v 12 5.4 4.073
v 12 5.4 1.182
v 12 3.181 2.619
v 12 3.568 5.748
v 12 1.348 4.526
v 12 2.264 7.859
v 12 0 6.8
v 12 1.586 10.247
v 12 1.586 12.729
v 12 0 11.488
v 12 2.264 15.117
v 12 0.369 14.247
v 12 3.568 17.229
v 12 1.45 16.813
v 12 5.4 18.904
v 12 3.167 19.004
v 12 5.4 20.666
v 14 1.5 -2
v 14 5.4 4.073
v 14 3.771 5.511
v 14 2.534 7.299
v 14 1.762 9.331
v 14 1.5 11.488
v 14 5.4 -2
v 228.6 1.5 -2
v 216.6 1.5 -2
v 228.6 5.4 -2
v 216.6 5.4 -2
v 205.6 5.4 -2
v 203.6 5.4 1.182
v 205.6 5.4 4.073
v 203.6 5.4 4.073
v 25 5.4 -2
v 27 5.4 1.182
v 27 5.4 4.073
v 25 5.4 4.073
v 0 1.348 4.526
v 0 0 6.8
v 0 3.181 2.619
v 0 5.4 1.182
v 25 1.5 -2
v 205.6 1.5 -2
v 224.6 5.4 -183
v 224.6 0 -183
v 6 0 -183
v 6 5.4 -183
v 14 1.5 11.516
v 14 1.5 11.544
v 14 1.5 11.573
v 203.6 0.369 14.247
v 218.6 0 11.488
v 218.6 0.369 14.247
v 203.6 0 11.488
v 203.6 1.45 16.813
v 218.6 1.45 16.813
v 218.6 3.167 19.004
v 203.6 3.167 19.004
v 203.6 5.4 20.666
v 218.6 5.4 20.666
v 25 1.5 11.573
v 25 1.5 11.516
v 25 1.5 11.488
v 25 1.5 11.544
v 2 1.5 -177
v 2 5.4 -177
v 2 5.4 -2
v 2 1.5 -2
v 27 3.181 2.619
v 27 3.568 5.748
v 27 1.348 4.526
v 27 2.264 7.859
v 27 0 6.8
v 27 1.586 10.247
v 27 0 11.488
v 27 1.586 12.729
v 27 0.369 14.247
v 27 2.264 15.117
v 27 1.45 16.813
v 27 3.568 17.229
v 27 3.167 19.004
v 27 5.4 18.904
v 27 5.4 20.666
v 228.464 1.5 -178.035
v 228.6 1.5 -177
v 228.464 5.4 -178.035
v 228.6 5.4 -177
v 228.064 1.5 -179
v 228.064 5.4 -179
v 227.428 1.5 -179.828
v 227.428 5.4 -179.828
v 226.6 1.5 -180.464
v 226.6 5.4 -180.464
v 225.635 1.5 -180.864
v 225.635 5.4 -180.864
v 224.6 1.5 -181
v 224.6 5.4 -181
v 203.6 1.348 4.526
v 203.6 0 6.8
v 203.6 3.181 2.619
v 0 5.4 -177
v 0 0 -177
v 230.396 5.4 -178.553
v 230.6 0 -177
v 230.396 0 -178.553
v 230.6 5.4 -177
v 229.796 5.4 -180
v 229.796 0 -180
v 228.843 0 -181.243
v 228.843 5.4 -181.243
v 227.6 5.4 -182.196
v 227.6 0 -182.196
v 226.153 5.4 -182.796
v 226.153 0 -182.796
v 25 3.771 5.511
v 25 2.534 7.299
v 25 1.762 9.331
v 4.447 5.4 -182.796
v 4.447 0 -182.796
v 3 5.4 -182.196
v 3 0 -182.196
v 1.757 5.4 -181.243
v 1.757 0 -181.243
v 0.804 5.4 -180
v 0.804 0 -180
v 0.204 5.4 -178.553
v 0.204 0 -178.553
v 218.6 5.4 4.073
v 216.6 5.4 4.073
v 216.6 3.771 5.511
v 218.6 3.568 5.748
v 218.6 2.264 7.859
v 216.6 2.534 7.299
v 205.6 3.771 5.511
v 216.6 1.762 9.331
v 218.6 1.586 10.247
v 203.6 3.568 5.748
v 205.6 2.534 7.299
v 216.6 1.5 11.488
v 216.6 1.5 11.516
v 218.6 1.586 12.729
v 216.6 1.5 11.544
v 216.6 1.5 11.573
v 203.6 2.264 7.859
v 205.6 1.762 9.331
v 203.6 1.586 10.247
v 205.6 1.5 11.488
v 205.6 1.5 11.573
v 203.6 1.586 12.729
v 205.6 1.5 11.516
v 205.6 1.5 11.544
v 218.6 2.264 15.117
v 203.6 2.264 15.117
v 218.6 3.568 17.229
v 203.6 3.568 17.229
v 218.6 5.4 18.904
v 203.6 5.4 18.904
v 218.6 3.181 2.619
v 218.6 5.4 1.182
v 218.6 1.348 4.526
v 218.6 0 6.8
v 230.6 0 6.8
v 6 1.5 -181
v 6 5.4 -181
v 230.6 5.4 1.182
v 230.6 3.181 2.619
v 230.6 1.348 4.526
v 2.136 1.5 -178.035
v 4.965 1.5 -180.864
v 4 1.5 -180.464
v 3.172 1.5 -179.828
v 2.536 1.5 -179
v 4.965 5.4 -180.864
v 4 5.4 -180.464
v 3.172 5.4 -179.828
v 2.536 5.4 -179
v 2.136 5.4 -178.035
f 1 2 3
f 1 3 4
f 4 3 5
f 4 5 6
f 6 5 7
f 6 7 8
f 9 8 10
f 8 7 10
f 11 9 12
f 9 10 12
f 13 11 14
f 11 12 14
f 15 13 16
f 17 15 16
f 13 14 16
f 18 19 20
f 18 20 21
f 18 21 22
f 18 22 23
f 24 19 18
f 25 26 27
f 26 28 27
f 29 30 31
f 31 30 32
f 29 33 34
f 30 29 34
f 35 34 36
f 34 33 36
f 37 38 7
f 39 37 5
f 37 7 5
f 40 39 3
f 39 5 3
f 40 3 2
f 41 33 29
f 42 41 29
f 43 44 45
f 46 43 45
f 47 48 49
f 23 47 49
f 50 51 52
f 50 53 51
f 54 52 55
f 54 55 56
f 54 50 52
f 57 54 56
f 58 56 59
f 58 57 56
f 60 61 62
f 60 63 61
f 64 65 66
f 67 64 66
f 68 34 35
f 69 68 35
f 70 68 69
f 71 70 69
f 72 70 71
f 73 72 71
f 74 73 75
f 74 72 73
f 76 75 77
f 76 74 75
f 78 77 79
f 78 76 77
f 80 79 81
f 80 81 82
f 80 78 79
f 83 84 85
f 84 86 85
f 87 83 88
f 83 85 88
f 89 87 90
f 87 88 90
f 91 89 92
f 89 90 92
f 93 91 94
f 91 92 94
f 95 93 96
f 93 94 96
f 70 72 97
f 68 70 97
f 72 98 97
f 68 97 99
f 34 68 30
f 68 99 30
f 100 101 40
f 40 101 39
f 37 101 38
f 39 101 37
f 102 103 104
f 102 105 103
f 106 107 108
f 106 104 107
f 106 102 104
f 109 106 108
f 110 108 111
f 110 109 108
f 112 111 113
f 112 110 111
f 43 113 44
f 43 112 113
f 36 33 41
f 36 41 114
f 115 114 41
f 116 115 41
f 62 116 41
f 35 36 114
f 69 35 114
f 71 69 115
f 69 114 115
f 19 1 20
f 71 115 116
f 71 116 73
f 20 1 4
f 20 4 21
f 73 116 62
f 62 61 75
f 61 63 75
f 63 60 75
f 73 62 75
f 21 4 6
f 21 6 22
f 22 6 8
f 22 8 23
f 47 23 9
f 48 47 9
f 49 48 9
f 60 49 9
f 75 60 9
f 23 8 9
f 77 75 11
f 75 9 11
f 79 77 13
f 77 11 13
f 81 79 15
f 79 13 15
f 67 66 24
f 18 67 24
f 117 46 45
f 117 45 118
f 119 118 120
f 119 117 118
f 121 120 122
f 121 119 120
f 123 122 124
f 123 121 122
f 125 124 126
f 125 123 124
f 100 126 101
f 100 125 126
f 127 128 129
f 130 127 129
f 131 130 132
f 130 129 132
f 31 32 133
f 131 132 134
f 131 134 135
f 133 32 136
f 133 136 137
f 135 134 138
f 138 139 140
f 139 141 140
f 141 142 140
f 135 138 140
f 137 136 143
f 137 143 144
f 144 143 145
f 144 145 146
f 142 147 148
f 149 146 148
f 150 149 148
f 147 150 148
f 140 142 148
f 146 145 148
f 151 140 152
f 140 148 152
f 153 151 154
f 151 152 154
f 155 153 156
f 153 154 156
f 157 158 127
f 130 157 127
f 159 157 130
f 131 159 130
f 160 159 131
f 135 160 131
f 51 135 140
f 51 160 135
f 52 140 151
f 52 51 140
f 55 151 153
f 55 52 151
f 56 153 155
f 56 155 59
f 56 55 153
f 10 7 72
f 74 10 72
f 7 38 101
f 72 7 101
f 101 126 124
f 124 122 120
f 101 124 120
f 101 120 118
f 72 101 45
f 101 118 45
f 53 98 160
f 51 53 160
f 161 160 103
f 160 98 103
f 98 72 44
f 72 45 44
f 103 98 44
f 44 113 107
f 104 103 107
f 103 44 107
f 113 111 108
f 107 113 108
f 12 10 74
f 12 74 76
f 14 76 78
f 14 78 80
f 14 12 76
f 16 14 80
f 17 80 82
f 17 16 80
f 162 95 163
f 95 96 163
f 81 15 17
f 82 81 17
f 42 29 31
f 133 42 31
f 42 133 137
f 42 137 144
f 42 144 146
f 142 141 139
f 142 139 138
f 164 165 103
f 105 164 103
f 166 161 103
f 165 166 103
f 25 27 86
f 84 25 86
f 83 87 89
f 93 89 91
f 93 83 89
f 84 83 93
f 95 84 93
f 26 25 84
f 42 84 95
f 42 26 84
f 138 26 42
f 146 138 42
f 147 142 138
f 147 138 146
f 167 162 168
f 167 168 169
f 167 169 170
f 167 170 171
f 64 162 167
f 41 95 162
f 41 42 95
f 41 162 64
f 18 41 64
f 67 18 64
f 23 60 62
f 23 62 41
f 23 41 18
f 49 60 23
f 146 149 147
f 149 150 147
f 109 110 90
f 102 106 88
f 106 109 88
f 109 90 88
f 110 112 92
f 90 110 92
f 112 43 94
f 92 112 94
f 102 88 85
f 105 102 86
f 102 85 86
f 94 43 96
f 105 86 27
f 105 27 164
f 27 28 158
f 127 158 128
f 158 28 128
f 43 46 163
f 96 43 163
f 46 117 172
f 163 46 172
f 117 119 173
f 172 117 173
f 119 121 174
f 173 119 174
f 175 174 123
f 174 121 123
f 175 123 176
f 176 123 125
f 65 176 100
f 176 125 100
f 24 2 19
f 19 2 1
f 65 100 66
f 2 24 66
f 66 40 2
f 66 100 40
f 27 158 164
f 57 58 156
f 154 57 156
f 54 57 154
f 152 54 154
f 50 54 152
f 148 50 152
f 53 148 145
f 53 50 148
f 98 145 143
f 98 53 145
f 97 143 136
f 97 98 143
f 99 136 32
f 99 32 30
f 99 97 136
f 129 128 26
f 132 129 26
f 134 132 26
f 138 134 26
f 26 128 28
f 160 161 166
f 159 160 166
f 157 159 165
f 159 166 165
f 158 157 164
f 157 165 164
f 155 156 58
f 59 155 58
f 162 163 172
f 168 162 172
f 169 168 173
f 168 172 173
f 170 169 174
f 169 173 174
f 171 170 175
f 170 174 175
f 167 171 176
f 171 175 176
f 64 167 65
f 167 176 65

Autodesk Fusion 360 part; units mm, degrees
sketch "Sketch1" plane through (0, 0, 0) normal (0, 1, 0) x (1, 0, 0)
  line L0 (0, 0) -> (230.6, 0)
  line L1 (230.6, 0) -> (230.6, 183)
  line L2 (230.6, 183) -> (0, 183)
  line L3 (0, 183) -> (0, 0)
  dimension "d1" = 230.6
  dimension "d2" = 183
extrude "Extrude1" add sketch "Sketch1" along normal blind 10
sketch "Sketch9" plane through (0, 0, 0) normal (-1, 0, 0) x (0, 0, 1)
  line L0 (-183, 0) -> (0, 0)
  line L1 (0, 0) -> (0, 10)
  line L2 (0, 10) -> (-183, 10)
  line L3 (-183, 10) -> (-183, 0)
  circle A0 centre (11.4881, 10.5) radius 10.5
  line L4 (11.4881, 0) -> (0, 0)
  circle A1 centre (11.4881, 10.5) radius 9
  line L5 (0, 0) -> (1, 0)
  line L6 (1, 0) -> (1, 10)
  line L7 (1, 10) -> (0, 10)
  line L8 (0, 10) -> (0, 0)
  dimension "d69" = 21
  dimension "d70" = 18
  dimension "d94" = 1
extrude "Extrude8" add sketch "Sketch9" against normal up to surface (230.6 mm away) contours L1 L4 L5 L6 L7 L8 | A0 L4 L6 | A0
sketch "Sketch10" plane through (0, 0, 0) normal (0, -1, 0) x (1, 0, 0)
  line L0 (230.6, -183) -> (230.6, 11.4881)
  line L1 (230.6, 11.4881) -> (0, 11.4881)
  line L2 (0, 11.4881) -> (0, -183)
  line L3 (230.6, 0) -> (218.6, 0)
  line L4 (218.6, 0) -> (218.6, 22)
  line L5 (218.6, 22) -> (230.6, 22)
  line L6 (230.6, 22) -> (230.6, 0)
  line L7 (203.6, 0) -> (27, 0)
  line L8 (27, 0) -> (27, 22)
  line L9 (27, 22) -> (203.6, 22)
  line L10 (203.6, 22) -> (203.6, 0)
  line L11 (0, 0) -> (12, 0)
  line L12 (12, 0) -> (12, 22)
  line L13 (12, 22) -> (0, 22)
  line L14 (0, 22) -> (0, 0)
  line L15 (0, -183) -> (230.6, -183)
  dimension "d73" = 22
  dimension "d74" = 12
  dimension "d75" = 12
  dimension "d76" = 15
  dimension "d77" = 15
extrude "Extrude9" cut sketch "Sketch10" against normal through all contours L0 L1 L3 L4 L6 | L1 L4 L5 L6 | L1 L2 L11 L12 L14 | L1 L12 L13 L14 | L1 L7 L8 L10 | L1 L8 L9 L10
sketch "Sketch11" plane through (0, 10, 0) normal (0, 1, 0) x (-1, 0, 0)
  line L0 (0, -183) -> (0, 0)
  line L1 (-1.8, -176) -> (-228.8, -176)
  line L2 (-228.8, -176) -> (-228.8, -1)
  line L3 (-228.8, -1) -> (-1.8, -1)
  line L4 (-1.8, -1) -> (-1.8, -176)
  line L5 (-115.3, -122.9084) -> (-115.3, -50) construction
  line L6 (-230.6, 0) -> (-230.6, -183)
  line L7 (-230.6, -183) -> (0, -183)
  line L8 (-12, 0) -> (-12, 1)
  line L9 (-12, 1) -> (-27, 1)
  line L10 (-27, 1) -> (-27, 0)
  line L11 (-27, 0) -> (-203.6, 0)
  line L12 (-203.6, 0) -> (-203.6, 1)
  line L13 (-203.6, 1) -> (-218.6, 1)
  line L14 (-218.6, 1) -> (-218.6, 0)
  line L15 (-218.6, 0) -> (-230.6, 0)
  line L16 (0, 0) -> (-12, 0)
  dimension "d79" = 227
  dimension "d80" = 175
extrude "Extrude10" cut sketch "Sketch11" against normal blind 2 contours L1 L2 L3 L4
sketch "Sketch12" plane through (0, 8, 0) normal (0, 1, 0) x (-1, 0, 0)
  line L0 (-1.8, -1) -> (-228.8, -1)
  line L1 (-1.8, -176) -> (-1.8, -1)
  line L2 (-6.95, -6.345) -> (-223.65, -6.345)
  line L3 (-223.65, -6.345) -> (-223.65, -181.345)
  line L4 (-223.65, -181.345) -> (-6.95, -181.345)
  line L5 (-6.95, -181.345) -> (-6.95, -6.345)
  line L6 (-10.47, -167.125) -> (-220.13, -167.125)
  line L7 (-220.13, -167.125) -> (-220.13, -9.875)
  line L8 (-220.13, -9.875) -> (-10.47, -9.875)
  line L9 (-10.47, -9.875) -> (-10.47, -167.125)
  line L10 (-85, -88.5) -> (-145, -88.5) construction
  line L11 (-115.3, -115.3819) -> (-115.3, -64.9996) construction
  line L12 (-228.8, -1) -> (-228.8, -176)
  line L13 (-228.8, -176) -> (-1.8, -176)
  dimension "d84" = 175
  dimension "d85" = 216.7
  dimension "d86" = 209.66
  dimension "d87" = 157.25
  dimension "d88" = 3.52
  dimension "d89" = 3.53
extrude "Extrude11" cut sketch "Sketch12" against normal blind 1 contours L2 L3 L5 L13 | L3 L4 L5 L13 | L6 L7 L8 L9
fillet "Fillet1" radius 6 2 edges at (0, 5, -183) (230.6, 5, -183)
sketch "Sketch15" plane through (12, 0, 0) normal (-1, 0, 0) x (0, 0, 1)
  line L0 (0, 10) -> (0, 0)
  line L1 (0, 0) -> (11.4881, 0)
  arc A0 (11.4881, 0) -> (1, 10) centre (11.4881, 10.5) ccw
  circle A1 centre (11.4881, 10.5) radius 11.499
  line L2 (0, 0) -> (6.8002, 0)
  line L3 (1, 10) -> (0, 10)
  circle A2 centre (11.4881, 10.5) radius 9
extrude "Extrude14" add sketch "Sketch15" along normal blind 12 and the other way blind 218.6 contours L0 L1 A1 L2
sketch "Sketch13" plane through (0, 0, 0) normal (-1, 0, 0) x (0, 0, 1)
  line L0 (-177, 10) -> (-177, 0)
  line L1 (-177, 0) -> (6.8002, 0)
  line L2 (0, 10) -> (-177, 10)
  line L3 (-183, 5.4) -> (22, 5.4)
  line L4 (22, 5.4) -> (22, 23.4)
  line L5 (22, 23.4) -> (-183, 23.4)
  line L6 (-183, 23.4) -> (-183, 5.4)
  arc A0 (0, 10) -> (6.8002, 0) centre (11.4881, 10.5) ccw
  dimension "d95" = 4.6
  dimension "d96" = 6
  dimension "d97" = 205
  dimension "d98" = 18
extrude "Extrude12" cut sketch "Sketch13" against normal through all contours L0 L2 L3 A0 | L0 L2 L3 L4 L5 L6 A0
sketch "Sketch14" plane through (0, 5.4, 0) normal (0, 1, 0) x (-1, 0, 0)
  arc A0 (-6, -183) -> (0, -177) centre (-6, -177) ccw
  line L0 (0, -177) -> (0, 1.182)
  line L1 (-12, 1.182) -> (-12, 4.0726)
  line L2 (-12, 4.0726) -> (-27, 4.0726)
  line L3 (-27, 4.0726) -> (-27, 1.182)
  line L4 (-203.6, 1.182) -> (-203.6, 4.0726)
  line L5 (-203.6, 4.0726) -> (-218.6, 4.0726)
  line L6 (-218.6, 4.0726) -> (-218.6, 1.182)
  line L7 (-230.6, 1.182) -> (-230.6, -177)
  arc A1 (-230.6, -177) -> (-224.6, -183) centre (-224.6, -177) ccw
  line L8 (-224.6, -183) -> (-6, -183)
  line L9 (-2, -177) -> (-2, -2)
  line L10 (-2, -2) -> (-14, -2)
  line L11 (-14, -2) -> (-14, 2.0726)
  line L12 (-14, 2.0726) -> (-25, 2.0726)
  line L13 (-25, 2.0726) -> (-25, -2)
  line L14 (-25, -2) -> (-205.6, -2)
  line L15 (-205.6, -2) -> (-205.6, 2.0726)
  line L16 (-205.6, 2.0726) -> (-216.6, 2.0726)
  line L17 (-216.6, 2.0726) -> (-216.6, -2)
  line L18 (-216.6, -2) -> (-228.6, -2)
  line L19 (-228.6, -2) -> (-228.6, -177)
  arc A2 (-228.6, -177) -> (-224.6, -181) centre (-224.6, -177) ccw
  line L20 (-224.6, -181) -> (-6, -181)
  arc A3 (-6, -181) -> (-2, -177) centre (-6, -177) ccw
  line L21 (-14, 2.0726) -> (-25, 2.0726)
  line L22 (-25, 2.0726) -> (-25, 11.5726)
  line L23 (-25, 11.5726) -> (-14, 11.5726)
  line L24 (-14, 11.5726) -> (-14, 2.0726)
  line L25 (-205.6, 2.0726) -> (-216.6, 2.0726)
  line L26 (-216.6, 2.0726) -> (-216.6, 11.5726)
  line L27 (-216.6, 11.5726) -> (-205.6, 11.5726)
  line L28 (-205.6, 11.5726) -> (-205.6, 2.0726)
  line L29 (-27, 1.182) -> (-203.6, 1.182)
  line L30 (-218.6, 1.182) -> (-230.6, 1.182)
  line L31 (0, 1.182) -> (-12, 1.182)
  dimension "d101" = 9.5
  dimension "d102" = 9.5
extrude "Extrude13" cut sketch "Sketch14" against normal blind 3.9 contours L2 L12 L21 L22 L24 | L2 L22 L23 L24 | L9 L10 L11 L12 L13 L14 L15 L16 L17 L18 L19 A2 L20 A3 L21 L25 | L5 L26 L27 L28 | L5 L16 L25 L26 L28
